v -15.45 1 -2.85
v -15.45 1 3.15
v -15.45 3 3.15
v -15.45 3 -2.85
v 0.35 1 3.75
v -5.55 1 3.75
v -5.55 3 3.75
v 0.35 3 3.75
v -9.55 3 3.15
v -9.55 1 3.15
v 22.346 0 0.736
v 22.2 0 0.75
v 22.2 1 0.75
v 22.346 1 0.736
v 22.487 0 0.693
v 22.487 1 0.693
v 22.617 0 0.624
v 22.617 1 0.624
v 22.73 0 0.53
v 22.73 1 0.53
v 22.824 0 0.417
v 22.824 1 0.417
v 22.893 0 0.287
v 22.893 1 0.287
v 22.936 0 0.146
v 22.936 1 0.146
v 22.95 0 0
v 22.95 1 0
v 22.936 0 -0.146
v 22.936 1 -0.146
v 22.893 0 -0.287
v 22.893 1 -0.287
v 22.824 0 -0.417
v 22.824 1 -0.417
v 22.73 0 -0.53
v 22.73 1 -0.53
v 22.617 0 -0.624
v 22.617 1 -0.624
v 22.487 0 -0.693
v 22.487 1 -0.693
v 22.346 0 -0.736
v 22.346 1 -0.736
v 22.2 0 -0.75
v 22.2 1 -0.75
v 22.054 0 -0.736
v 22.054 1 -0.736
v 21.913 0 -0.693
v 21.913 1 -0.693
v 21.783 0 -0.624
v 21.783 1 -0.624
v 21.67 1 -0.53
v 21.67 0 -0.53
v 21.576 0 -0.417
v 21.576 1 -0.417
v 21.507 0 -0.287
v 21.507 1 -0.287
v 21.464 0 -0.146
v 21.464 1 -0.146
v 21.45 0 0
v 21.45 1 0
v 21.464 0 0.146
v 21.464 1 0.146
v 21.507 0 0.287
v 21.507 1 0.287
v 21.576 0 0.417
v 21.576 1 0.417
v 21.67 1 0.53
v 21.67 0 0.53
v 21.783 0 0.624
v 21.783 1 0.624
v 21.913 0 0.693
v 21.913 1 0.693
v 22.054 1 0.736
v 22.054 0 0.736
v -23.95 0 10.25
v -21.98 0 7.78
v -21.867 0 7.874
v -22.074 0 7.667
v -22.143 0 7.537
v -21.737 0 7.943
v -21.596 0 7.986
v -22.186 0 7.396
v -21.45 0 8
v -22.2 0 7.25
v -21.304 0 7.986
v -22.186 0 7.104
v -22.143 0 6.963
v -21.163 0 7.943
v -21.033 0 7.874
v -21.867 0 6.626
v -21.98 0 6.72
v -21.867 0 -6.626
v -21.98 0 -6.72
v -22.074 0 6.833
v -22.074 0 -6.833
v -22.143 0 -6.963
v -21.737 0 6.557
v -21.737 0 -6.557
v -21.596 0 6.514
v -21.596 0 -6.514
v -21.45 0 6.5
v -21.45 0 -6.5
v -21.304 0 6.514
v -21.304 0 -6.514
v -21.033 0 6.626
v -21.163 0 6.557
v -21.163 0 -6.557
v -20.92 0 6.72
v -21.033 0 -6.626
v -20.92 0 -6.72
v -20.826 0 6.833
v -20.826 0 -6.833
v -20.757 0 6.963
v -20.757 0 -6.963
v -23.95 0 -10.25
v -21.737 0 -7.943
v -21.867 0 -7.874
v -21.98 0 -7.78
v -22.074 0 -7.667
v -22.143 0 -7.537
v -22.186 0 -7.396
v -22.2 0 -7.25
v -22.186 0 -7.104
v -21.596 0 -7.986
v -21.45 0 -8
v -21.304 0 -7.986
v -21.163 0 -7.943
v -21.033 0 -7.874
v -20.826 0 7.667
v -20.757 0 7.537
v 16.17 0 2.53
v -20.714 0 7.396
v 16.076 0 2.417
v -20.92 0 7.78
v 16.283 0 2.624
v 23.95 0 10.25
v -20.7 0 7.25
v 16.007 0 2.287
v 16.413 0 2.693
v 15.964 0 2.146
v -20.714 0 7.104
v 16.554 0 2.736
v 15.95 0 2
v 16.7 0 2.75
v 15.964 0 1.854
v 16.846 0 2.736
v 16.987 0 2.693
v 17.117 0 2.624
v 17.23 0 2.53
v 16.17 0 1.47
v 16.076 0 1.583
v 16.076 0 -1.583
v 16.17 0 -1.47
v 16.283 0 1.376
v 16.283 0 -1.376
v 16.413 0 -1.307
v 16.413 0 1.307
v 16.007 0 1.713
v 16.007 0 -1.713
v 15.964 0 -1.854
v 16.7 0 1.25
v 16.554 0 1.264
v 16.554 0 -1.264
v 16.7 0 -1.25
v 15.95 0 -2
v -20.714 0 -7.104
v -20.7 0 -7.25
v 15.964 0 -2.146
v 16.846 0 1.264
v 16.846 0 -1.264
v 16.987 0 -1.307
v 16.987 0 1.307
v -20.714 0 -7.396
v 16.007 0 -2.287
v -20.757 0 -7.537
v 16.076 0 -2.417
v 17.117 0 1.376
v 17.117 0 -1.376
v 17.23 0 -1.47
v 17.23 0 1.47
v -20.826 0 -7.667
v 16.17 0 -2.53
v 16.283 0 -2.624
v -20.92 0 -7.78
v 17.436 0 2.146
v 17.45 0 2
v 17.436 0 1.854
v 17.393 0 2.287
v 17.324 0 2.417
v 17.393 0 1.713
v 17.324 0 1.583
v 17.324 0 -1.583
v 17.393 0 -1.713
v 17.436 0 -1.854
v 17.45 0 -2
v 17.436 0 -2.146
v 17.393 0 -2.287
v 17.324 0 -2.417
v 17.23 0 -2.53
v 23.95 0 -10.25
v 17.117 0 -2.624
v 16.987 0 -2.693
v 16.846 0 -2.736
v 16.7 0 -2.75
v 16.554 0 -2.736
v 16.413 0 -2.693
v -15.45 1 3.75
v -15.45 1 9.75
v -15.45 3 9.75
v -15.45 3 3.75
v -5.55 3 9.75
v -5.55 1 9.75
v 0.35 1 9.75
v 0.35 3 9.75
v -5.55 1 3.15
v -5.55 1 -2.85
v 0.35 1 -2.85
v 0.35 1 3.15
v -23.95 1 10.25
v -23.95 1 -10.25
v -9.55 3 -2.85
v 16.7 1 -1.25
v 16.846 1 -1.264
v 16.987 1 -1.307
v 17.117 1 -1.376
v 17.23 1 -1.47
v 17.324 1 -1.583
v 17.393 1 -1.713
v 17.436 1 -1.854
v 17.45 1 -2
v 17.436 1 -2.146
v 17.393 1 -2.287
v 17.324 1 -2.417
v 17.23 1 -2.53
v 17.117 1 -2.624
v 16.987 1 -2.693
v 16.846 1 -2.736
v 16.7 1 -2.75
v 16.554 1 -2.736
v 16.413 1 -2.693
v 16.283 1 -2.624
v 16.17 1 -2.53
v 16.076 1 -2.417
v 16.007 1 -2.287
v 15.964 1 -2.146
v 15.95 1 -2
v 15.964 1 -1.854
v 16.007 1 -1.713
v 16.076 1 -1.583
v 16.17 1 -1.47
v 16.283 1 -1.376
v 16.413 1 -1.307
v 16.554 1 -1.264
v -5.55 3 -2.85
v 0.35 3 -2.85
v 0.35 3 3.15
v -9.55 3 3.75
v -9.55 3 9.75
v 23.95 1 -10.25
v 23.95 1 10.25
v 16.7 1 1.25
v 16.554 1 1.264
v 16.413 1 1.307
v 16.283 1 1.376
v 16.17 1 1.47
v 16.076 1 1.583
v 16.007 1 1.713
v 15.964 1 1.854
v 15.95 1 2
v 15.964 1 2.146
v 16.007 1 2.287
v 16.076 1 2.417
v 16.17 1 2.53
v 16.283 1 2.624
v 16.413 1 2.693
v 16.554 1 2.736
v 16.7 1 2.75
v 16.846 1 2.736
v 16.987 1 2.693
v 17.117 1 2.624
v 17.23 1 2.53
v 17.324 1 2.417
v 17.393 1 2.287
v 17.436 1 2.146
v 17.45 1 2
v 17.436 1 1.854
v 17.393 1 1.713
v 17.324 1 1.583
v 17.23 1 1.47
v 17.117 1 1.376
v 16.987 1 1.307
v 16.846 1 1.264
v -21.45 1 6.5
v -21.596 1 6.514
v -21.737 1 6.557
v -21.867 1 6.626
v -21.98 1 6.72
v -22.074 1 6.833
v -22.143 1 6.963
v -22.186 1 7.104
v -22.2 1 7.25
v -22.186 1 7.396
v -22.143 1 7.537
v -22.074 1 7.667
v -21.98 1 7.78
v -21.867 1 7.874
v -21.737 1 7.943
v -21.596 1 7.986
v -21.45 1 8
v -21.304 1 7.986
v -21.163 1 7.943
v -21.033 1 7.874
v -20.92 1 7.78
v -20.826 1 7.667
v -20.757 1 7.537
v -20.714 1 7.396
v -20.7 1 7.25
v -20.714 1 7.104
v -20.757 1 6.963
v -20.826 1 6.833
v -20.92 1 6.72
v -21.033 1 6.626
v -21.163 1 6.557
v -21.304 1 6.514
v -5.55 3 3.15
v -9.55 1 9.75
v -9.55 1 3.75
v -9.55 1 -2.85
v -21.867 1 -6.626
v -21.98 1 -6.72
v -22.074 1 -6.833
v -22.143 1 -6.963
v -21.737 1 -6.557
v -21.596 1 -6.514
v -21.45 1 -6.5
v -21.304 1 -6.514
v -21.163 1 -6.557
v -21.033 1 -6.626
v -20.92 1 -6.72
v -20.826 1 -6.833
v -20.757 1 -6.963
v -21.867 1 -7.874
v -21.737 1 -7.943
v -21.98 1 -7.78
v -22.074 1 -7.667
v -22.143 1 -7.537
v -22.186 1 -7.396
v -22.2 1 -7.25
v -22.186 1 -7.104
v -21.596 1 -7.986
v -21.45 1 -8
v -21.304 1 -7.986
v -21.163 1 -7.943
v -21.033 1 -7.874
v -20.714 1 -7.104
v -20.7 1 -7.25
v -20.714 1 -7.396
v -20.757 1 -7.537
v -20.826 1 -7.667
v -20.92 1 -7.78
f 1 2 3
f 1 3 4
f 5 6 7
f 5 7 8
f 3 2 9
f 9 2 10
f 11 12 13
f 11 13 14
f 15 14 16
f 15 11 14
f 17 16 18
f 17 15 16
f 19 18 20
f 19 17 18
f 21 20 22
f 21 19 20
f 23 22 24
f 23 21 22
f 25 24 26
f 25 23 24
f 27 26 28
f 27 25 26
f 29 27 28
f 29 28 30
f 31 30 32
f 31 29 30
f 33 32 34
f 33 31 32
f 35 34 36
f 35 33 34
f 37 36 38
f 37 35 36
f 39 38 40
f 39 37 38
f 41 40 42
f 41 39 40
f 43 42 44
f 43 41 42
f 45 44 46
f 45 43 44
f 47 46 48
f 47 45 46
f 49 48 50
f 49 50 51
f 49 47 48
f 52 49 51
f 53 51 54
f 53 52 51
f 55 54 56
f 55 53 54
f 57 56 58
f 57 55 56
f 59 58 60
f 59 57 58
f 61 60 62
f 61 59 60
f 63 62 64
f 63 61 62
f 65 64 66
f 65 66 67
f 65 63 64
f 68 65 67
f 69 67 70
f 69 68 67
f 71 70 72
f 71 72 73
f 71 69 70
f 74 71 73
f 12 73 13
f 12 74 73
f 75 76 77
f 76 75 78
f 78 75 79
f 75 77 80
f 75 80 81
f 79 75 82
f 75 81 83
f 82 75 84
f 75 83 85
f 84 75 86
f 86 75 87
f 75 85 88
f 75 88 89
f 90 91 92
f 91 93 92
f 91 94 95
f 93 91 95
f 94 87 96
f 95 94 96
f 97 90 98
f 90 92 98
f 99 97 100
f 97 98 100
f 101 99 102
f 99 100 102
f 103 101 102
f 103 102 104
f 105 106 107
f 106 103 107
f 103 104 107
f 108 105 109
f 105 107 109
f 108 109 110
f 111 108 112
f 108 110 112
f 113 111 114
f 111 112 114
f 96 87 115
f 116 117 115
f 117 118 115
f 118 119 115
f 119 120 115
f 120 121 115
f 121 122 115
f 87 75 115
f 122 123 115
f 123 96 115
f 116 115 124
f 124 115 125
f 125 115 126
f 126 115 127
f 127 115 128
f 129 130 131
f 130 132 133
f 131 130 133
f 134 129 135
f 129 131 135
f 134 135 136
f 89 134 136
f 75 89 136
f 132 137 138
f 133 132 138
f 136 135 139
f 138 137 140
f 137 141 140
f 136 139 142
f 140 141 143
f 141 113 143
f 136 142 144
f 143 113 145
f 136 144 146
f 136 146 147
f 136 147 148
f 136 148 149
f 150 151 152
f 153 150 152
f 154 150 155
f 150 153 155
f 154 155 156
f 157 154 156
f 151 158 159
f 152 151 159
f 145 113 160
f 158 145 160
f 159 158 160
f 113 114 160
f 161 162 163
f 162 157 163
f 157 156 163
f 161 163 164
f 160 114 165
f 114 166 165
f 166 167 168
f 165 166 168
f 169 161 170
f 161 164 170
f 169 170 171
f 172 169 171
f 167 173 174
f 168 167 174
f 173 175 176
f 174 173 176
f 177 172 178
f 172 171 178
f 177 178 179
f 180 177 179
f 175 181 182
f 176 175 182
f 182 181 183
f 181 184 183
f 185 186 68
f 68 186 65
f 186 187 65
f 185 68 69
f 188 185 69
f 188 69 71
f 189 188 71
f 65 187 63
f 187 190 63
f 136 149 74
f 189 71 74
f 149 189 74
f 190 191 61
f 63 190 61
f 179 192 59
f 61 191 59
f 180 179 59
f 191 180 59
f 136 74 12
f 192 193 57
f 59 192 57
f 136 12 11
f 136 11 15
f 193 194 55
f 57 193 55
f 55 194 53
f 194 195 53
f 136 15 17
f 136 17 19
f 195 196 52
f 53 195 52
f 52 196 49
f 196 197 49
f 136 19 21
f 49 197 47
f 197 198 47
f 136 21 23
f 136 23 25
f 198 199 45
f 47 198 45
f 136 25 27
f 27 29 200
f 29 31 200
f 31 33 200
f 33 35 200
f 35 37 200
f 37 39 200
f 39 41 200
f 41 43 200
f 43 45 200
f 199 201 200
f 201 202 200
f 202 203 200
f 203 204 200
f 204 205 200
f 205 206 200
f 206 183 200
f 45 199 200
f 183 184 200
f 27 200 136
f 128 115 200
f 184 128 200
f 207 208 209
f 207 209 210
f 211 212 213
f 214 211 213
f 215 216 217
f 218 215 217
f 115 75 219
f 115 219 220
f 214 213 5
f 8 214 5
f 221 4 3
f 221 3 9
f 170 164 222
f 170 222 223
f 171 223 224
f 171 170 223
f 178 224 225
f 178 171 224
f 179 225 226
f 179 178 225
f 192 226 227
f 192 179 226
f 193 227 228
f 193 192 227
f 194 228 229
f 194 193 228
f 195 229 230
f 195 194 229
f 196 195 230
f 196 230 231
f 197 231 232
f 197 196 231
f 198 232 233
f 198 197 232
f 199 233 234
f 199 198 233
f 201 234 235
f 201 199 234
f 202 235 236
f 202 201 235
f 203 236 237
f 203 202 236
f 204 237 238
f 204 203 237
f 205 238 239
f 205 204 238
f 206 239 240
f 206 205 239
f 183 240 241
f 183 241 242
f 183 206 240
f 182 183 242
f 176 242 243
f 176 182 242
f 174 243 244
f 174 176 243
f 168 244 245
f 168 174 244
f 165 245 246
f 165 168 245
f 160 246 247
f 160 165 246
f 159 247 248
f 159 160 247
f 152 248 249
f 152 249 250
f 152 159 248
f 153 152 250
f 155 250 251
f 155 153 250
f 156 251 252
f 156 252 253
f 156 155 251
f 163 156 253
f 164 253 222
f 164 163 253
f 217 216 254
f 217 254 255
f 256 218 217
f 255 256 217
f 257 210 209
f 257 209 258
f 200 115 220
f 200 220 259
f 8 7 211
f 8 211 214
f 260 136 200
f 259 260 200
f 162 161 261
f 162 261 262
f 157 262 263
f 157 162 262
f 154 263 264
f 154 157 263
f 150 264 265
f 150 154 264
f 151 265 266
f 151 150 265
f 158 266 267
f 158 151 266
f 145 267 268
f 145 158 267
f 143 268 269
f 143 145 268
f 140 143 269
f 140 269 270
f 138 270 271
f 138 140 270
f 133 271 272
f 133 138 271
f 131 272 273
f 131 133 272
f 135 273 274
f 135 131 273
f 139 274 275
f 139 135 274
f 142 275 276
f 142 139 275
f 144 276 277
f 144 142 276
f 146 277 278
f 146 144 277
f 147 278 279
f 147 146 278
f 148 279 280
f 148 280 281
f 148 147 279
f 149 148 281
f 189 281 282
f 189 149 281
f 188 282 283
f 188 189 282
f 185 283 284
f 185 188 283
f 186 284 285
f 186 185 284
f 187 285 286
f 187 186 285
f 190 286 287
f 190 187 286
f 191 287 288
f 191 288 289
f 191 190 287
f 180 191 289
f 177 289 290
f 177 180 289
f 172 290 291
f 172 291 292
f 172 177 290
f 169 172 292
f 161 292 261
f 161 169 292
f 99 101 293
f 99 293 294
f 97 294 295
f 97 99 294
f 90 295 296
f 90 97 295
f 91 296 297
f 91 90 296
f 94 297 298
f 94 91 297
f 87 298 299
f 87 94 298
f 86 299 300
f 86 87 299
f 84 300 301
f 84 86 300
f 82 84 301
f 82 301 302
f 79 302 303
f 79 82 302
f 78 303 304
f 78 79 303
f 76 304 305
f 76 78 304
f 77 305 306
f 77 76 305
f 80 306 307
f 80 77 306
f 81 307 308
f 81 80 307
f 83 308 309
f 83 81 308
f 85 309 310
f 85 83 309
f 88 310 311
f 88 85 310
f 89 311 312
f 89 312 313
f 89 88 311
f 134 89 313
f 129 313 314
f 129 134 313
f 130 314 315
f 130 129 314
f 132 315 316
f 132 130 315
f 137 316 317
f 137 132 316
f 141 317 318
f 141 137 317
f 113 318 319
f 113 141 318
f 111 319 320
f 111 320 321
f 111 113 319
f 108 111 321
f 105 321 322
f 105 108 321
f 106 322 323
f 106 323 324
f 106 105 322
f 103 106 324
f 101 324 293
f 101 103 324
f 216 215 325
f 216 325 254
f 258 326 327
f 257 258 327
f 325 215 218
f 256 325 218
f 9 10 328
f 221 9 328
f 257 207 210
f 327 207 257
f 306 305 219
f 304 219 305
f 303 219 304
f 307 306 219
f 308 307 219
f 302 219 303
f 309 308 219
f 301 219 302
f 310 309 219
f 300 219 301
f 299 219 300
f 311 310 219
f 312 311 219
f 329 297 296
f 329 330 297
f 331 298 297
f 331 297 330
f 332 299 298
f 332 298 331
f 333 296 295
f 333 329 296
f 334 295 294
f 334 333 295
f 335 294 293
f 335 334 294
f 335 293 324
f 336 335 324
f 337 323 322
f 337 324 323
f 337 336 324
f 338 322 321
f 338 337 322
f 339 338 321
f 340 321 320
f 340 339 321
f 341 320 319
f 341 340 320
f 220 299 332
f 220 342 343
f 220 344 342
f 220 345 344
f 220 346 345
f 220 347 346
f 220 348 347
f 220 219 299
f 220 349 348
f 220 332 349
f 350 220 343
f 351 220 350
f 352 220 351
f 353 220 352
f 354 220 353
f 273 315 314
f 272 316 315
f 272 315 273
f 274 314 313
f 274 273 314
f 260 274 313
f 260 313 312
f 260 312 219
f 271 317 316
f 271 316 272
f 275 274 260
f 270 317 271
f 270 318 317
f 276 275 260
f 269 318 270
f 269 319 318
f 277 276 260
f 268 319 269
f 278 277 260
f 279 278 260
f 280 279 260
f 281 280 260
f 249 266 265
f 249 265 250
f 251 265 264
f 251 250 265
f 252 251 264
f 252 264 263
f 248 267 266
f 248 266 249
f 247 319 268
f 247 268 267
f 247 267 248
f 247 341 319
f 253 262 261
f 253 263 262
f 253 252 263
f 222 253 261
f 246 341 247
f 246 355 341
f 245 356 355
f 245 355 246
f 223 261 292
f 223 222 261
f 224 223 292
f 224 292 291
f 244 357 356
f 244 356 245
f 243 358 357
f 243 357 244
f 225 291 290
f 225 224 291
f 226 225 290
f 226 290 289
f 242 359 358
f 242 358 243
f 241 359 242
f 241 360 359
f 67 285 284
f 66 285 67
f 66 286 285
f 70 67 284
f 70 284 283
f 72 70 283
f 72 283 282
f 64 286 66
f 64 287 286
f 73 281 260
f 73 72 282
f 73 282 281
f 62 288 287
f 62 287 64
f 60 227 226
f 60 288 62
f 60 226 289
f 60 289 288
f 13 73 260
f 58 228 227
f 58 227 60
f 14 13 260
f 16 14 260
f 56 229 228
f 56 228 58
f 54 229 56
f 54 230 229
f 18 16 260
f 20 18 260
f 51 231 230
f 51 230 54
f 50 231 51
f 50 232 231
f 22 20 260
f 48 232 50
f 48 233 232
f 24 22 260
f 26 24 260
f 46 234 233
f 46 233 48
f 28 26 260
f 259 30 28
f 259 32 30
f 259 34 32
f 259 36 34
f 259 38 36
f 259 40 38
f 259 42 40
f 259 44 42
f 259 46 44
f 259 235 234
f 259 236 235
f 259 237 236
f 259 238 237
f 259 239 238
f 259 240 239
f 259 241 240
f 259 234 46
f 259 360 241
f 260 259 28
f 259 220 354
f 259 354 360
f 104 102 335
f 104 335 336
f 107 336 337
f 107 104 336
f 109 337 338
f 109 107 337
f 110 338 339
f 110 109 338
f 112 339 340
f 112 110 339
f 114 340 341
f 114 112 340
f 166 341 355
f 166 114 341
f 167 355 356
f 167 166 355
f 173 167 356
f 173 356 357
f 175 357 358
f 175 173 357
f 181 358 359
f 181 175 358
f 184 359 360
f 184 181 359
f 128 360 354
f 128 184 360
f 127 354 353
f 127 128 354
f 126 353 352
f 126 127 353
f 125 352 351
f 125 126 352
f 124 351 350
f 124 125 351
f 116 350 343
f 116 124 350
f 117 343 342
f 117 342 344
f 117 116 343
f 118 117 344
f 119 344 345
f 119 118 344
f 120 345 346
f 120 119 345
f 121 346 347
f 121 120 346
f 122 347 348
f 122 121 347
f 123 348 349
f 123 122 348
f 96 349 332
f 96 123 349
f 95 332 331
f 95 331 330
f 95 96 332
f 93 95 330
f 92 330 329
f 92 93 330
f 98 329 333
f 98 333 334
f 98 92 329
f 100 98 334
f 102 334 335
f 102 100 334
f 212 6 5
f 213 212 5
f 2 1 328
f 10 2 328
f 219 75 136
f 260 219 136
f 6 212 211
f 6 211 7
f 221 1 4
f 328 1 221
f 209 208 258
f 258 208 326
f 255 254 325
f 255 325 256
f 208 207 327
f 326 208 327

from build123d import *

# Parameters (mm, degrees)
CROQUIS1_W                = 47.9
CROQUIS1_H                = 20.5
CROQUIS1_R                = 0.75
SALIENTE_EXTRUIR1_DEPTH   = 1
CROQUIS2_W                = 5.9
CROQUIS2_H                = 6
SALIENTE_EXTRUIR2_DEPTH   = 2
SALIENTE_EXTRUIR2_2_DEPTH = 2
SALIENTE_EXTRUIR2_3_DEPTH = 2
SALIENTE_EXTRUIR2_4_DEPTH = 2


with BuildPart() as part:
    # Croquis1 → Saliente-Extruir1 (new body)
    with BuildSketch(Plane(origin=(0, 0, 0), x_dir=(1, 0, 0), z_dir=(0, 1, 0))):
        Rectangle(CROQUIS1_W, CROQUIS1_H)
        with Locations(Location((22.2, 0, 0), (0, 0, 270))):
            Circle(CROQUIS1_R, mode=Mode.SUBTRACT)
        with Locations(Location((16.7, 2, 0), (0, 0, 270))):
            Circle(CROQUIS1_R, mode=Mode.SUBTRACT)
        with Locations(Location((-21.45, 7.25, 0), (0, 0, 270))):
            Circle(CROQUIS1_R, mode=Mode.SUBTRACT)
        with Locations(Location((16.7, -2, 0), (0, 0, 90))):
            Circle(CROQUIS1_R, mode=Mode.SUBTRACT)
        with Locations(Location((-21.45, -7.25, 0), (0, 0, 90))):
            Circle(CROQUIS1_R, mode=Mode.SUBTRACT)
    extrude(amount=SALIENTE_EXTRUIR1_DEPTH)


with BuildPart() as body_2:
    # Croquis2 → Saliente-Extruir2 (new body)
    with BuildSketch(Plane(origin=(0, 1, 0), x_dir=(1, 0, 0), z_dir=(0, 1, 0))):
        with Locations((-12.5, -0.15)):
            Rectangle(CROQUIS2_W, CROQUIS2_H)
    extrude(amount=SALIENTE_EXTRUIR2_DEPTH)


with BuildPart() as body_3:
    # Croquis2 → Saliente-Extruir2 2 (new body)
    with BuildSketch(Plane(origin=(0, 1, 0), x_dir=(1, 0, 0), z_dir=(0, 1, 0))):
        with Locations((-12.5, -6.75)):
            Rectangle(CROQUIS2_W, CROQUIS2_H)
    extrude(amount=SALIENTE_EXTRUIR2_2_DEPTH)


with BuildPart() as body_4:
    # Croquis2 → Saliente-Extruir2 3 (new body)
    with BuildSketch(Plane(origin=(0, 1, 0), x_dir=(1, 0, 0), z_dir=(0, 1, 0))):
        with Locations((-2.6, -6.75)):
            Rectangle(CROQUIS2_W, CROQUIS2_H)
    extrude(amount=SALIENTE_EXTRUIR2_3_DEPTH)


with BuildPart() as body_5:
    # Croquis2 → Saliente-Extruir2 4 (new body)
    with BuildSketch(Plane(origin=(0, 1, 0), x_dir=(1, 0, 0), z_dir=(0, 1, 0))):
        with Locations((-2.6, -0.15)):
            Rectangle(CROQUIS2_W, CROQUIS2_H)
    extrude(amount=SALIENTE_EXTRUIR2_4_DEPTH)


solid = Compound([part.part, body_2.part, body_3.part, body_4.part, body_5.part])
